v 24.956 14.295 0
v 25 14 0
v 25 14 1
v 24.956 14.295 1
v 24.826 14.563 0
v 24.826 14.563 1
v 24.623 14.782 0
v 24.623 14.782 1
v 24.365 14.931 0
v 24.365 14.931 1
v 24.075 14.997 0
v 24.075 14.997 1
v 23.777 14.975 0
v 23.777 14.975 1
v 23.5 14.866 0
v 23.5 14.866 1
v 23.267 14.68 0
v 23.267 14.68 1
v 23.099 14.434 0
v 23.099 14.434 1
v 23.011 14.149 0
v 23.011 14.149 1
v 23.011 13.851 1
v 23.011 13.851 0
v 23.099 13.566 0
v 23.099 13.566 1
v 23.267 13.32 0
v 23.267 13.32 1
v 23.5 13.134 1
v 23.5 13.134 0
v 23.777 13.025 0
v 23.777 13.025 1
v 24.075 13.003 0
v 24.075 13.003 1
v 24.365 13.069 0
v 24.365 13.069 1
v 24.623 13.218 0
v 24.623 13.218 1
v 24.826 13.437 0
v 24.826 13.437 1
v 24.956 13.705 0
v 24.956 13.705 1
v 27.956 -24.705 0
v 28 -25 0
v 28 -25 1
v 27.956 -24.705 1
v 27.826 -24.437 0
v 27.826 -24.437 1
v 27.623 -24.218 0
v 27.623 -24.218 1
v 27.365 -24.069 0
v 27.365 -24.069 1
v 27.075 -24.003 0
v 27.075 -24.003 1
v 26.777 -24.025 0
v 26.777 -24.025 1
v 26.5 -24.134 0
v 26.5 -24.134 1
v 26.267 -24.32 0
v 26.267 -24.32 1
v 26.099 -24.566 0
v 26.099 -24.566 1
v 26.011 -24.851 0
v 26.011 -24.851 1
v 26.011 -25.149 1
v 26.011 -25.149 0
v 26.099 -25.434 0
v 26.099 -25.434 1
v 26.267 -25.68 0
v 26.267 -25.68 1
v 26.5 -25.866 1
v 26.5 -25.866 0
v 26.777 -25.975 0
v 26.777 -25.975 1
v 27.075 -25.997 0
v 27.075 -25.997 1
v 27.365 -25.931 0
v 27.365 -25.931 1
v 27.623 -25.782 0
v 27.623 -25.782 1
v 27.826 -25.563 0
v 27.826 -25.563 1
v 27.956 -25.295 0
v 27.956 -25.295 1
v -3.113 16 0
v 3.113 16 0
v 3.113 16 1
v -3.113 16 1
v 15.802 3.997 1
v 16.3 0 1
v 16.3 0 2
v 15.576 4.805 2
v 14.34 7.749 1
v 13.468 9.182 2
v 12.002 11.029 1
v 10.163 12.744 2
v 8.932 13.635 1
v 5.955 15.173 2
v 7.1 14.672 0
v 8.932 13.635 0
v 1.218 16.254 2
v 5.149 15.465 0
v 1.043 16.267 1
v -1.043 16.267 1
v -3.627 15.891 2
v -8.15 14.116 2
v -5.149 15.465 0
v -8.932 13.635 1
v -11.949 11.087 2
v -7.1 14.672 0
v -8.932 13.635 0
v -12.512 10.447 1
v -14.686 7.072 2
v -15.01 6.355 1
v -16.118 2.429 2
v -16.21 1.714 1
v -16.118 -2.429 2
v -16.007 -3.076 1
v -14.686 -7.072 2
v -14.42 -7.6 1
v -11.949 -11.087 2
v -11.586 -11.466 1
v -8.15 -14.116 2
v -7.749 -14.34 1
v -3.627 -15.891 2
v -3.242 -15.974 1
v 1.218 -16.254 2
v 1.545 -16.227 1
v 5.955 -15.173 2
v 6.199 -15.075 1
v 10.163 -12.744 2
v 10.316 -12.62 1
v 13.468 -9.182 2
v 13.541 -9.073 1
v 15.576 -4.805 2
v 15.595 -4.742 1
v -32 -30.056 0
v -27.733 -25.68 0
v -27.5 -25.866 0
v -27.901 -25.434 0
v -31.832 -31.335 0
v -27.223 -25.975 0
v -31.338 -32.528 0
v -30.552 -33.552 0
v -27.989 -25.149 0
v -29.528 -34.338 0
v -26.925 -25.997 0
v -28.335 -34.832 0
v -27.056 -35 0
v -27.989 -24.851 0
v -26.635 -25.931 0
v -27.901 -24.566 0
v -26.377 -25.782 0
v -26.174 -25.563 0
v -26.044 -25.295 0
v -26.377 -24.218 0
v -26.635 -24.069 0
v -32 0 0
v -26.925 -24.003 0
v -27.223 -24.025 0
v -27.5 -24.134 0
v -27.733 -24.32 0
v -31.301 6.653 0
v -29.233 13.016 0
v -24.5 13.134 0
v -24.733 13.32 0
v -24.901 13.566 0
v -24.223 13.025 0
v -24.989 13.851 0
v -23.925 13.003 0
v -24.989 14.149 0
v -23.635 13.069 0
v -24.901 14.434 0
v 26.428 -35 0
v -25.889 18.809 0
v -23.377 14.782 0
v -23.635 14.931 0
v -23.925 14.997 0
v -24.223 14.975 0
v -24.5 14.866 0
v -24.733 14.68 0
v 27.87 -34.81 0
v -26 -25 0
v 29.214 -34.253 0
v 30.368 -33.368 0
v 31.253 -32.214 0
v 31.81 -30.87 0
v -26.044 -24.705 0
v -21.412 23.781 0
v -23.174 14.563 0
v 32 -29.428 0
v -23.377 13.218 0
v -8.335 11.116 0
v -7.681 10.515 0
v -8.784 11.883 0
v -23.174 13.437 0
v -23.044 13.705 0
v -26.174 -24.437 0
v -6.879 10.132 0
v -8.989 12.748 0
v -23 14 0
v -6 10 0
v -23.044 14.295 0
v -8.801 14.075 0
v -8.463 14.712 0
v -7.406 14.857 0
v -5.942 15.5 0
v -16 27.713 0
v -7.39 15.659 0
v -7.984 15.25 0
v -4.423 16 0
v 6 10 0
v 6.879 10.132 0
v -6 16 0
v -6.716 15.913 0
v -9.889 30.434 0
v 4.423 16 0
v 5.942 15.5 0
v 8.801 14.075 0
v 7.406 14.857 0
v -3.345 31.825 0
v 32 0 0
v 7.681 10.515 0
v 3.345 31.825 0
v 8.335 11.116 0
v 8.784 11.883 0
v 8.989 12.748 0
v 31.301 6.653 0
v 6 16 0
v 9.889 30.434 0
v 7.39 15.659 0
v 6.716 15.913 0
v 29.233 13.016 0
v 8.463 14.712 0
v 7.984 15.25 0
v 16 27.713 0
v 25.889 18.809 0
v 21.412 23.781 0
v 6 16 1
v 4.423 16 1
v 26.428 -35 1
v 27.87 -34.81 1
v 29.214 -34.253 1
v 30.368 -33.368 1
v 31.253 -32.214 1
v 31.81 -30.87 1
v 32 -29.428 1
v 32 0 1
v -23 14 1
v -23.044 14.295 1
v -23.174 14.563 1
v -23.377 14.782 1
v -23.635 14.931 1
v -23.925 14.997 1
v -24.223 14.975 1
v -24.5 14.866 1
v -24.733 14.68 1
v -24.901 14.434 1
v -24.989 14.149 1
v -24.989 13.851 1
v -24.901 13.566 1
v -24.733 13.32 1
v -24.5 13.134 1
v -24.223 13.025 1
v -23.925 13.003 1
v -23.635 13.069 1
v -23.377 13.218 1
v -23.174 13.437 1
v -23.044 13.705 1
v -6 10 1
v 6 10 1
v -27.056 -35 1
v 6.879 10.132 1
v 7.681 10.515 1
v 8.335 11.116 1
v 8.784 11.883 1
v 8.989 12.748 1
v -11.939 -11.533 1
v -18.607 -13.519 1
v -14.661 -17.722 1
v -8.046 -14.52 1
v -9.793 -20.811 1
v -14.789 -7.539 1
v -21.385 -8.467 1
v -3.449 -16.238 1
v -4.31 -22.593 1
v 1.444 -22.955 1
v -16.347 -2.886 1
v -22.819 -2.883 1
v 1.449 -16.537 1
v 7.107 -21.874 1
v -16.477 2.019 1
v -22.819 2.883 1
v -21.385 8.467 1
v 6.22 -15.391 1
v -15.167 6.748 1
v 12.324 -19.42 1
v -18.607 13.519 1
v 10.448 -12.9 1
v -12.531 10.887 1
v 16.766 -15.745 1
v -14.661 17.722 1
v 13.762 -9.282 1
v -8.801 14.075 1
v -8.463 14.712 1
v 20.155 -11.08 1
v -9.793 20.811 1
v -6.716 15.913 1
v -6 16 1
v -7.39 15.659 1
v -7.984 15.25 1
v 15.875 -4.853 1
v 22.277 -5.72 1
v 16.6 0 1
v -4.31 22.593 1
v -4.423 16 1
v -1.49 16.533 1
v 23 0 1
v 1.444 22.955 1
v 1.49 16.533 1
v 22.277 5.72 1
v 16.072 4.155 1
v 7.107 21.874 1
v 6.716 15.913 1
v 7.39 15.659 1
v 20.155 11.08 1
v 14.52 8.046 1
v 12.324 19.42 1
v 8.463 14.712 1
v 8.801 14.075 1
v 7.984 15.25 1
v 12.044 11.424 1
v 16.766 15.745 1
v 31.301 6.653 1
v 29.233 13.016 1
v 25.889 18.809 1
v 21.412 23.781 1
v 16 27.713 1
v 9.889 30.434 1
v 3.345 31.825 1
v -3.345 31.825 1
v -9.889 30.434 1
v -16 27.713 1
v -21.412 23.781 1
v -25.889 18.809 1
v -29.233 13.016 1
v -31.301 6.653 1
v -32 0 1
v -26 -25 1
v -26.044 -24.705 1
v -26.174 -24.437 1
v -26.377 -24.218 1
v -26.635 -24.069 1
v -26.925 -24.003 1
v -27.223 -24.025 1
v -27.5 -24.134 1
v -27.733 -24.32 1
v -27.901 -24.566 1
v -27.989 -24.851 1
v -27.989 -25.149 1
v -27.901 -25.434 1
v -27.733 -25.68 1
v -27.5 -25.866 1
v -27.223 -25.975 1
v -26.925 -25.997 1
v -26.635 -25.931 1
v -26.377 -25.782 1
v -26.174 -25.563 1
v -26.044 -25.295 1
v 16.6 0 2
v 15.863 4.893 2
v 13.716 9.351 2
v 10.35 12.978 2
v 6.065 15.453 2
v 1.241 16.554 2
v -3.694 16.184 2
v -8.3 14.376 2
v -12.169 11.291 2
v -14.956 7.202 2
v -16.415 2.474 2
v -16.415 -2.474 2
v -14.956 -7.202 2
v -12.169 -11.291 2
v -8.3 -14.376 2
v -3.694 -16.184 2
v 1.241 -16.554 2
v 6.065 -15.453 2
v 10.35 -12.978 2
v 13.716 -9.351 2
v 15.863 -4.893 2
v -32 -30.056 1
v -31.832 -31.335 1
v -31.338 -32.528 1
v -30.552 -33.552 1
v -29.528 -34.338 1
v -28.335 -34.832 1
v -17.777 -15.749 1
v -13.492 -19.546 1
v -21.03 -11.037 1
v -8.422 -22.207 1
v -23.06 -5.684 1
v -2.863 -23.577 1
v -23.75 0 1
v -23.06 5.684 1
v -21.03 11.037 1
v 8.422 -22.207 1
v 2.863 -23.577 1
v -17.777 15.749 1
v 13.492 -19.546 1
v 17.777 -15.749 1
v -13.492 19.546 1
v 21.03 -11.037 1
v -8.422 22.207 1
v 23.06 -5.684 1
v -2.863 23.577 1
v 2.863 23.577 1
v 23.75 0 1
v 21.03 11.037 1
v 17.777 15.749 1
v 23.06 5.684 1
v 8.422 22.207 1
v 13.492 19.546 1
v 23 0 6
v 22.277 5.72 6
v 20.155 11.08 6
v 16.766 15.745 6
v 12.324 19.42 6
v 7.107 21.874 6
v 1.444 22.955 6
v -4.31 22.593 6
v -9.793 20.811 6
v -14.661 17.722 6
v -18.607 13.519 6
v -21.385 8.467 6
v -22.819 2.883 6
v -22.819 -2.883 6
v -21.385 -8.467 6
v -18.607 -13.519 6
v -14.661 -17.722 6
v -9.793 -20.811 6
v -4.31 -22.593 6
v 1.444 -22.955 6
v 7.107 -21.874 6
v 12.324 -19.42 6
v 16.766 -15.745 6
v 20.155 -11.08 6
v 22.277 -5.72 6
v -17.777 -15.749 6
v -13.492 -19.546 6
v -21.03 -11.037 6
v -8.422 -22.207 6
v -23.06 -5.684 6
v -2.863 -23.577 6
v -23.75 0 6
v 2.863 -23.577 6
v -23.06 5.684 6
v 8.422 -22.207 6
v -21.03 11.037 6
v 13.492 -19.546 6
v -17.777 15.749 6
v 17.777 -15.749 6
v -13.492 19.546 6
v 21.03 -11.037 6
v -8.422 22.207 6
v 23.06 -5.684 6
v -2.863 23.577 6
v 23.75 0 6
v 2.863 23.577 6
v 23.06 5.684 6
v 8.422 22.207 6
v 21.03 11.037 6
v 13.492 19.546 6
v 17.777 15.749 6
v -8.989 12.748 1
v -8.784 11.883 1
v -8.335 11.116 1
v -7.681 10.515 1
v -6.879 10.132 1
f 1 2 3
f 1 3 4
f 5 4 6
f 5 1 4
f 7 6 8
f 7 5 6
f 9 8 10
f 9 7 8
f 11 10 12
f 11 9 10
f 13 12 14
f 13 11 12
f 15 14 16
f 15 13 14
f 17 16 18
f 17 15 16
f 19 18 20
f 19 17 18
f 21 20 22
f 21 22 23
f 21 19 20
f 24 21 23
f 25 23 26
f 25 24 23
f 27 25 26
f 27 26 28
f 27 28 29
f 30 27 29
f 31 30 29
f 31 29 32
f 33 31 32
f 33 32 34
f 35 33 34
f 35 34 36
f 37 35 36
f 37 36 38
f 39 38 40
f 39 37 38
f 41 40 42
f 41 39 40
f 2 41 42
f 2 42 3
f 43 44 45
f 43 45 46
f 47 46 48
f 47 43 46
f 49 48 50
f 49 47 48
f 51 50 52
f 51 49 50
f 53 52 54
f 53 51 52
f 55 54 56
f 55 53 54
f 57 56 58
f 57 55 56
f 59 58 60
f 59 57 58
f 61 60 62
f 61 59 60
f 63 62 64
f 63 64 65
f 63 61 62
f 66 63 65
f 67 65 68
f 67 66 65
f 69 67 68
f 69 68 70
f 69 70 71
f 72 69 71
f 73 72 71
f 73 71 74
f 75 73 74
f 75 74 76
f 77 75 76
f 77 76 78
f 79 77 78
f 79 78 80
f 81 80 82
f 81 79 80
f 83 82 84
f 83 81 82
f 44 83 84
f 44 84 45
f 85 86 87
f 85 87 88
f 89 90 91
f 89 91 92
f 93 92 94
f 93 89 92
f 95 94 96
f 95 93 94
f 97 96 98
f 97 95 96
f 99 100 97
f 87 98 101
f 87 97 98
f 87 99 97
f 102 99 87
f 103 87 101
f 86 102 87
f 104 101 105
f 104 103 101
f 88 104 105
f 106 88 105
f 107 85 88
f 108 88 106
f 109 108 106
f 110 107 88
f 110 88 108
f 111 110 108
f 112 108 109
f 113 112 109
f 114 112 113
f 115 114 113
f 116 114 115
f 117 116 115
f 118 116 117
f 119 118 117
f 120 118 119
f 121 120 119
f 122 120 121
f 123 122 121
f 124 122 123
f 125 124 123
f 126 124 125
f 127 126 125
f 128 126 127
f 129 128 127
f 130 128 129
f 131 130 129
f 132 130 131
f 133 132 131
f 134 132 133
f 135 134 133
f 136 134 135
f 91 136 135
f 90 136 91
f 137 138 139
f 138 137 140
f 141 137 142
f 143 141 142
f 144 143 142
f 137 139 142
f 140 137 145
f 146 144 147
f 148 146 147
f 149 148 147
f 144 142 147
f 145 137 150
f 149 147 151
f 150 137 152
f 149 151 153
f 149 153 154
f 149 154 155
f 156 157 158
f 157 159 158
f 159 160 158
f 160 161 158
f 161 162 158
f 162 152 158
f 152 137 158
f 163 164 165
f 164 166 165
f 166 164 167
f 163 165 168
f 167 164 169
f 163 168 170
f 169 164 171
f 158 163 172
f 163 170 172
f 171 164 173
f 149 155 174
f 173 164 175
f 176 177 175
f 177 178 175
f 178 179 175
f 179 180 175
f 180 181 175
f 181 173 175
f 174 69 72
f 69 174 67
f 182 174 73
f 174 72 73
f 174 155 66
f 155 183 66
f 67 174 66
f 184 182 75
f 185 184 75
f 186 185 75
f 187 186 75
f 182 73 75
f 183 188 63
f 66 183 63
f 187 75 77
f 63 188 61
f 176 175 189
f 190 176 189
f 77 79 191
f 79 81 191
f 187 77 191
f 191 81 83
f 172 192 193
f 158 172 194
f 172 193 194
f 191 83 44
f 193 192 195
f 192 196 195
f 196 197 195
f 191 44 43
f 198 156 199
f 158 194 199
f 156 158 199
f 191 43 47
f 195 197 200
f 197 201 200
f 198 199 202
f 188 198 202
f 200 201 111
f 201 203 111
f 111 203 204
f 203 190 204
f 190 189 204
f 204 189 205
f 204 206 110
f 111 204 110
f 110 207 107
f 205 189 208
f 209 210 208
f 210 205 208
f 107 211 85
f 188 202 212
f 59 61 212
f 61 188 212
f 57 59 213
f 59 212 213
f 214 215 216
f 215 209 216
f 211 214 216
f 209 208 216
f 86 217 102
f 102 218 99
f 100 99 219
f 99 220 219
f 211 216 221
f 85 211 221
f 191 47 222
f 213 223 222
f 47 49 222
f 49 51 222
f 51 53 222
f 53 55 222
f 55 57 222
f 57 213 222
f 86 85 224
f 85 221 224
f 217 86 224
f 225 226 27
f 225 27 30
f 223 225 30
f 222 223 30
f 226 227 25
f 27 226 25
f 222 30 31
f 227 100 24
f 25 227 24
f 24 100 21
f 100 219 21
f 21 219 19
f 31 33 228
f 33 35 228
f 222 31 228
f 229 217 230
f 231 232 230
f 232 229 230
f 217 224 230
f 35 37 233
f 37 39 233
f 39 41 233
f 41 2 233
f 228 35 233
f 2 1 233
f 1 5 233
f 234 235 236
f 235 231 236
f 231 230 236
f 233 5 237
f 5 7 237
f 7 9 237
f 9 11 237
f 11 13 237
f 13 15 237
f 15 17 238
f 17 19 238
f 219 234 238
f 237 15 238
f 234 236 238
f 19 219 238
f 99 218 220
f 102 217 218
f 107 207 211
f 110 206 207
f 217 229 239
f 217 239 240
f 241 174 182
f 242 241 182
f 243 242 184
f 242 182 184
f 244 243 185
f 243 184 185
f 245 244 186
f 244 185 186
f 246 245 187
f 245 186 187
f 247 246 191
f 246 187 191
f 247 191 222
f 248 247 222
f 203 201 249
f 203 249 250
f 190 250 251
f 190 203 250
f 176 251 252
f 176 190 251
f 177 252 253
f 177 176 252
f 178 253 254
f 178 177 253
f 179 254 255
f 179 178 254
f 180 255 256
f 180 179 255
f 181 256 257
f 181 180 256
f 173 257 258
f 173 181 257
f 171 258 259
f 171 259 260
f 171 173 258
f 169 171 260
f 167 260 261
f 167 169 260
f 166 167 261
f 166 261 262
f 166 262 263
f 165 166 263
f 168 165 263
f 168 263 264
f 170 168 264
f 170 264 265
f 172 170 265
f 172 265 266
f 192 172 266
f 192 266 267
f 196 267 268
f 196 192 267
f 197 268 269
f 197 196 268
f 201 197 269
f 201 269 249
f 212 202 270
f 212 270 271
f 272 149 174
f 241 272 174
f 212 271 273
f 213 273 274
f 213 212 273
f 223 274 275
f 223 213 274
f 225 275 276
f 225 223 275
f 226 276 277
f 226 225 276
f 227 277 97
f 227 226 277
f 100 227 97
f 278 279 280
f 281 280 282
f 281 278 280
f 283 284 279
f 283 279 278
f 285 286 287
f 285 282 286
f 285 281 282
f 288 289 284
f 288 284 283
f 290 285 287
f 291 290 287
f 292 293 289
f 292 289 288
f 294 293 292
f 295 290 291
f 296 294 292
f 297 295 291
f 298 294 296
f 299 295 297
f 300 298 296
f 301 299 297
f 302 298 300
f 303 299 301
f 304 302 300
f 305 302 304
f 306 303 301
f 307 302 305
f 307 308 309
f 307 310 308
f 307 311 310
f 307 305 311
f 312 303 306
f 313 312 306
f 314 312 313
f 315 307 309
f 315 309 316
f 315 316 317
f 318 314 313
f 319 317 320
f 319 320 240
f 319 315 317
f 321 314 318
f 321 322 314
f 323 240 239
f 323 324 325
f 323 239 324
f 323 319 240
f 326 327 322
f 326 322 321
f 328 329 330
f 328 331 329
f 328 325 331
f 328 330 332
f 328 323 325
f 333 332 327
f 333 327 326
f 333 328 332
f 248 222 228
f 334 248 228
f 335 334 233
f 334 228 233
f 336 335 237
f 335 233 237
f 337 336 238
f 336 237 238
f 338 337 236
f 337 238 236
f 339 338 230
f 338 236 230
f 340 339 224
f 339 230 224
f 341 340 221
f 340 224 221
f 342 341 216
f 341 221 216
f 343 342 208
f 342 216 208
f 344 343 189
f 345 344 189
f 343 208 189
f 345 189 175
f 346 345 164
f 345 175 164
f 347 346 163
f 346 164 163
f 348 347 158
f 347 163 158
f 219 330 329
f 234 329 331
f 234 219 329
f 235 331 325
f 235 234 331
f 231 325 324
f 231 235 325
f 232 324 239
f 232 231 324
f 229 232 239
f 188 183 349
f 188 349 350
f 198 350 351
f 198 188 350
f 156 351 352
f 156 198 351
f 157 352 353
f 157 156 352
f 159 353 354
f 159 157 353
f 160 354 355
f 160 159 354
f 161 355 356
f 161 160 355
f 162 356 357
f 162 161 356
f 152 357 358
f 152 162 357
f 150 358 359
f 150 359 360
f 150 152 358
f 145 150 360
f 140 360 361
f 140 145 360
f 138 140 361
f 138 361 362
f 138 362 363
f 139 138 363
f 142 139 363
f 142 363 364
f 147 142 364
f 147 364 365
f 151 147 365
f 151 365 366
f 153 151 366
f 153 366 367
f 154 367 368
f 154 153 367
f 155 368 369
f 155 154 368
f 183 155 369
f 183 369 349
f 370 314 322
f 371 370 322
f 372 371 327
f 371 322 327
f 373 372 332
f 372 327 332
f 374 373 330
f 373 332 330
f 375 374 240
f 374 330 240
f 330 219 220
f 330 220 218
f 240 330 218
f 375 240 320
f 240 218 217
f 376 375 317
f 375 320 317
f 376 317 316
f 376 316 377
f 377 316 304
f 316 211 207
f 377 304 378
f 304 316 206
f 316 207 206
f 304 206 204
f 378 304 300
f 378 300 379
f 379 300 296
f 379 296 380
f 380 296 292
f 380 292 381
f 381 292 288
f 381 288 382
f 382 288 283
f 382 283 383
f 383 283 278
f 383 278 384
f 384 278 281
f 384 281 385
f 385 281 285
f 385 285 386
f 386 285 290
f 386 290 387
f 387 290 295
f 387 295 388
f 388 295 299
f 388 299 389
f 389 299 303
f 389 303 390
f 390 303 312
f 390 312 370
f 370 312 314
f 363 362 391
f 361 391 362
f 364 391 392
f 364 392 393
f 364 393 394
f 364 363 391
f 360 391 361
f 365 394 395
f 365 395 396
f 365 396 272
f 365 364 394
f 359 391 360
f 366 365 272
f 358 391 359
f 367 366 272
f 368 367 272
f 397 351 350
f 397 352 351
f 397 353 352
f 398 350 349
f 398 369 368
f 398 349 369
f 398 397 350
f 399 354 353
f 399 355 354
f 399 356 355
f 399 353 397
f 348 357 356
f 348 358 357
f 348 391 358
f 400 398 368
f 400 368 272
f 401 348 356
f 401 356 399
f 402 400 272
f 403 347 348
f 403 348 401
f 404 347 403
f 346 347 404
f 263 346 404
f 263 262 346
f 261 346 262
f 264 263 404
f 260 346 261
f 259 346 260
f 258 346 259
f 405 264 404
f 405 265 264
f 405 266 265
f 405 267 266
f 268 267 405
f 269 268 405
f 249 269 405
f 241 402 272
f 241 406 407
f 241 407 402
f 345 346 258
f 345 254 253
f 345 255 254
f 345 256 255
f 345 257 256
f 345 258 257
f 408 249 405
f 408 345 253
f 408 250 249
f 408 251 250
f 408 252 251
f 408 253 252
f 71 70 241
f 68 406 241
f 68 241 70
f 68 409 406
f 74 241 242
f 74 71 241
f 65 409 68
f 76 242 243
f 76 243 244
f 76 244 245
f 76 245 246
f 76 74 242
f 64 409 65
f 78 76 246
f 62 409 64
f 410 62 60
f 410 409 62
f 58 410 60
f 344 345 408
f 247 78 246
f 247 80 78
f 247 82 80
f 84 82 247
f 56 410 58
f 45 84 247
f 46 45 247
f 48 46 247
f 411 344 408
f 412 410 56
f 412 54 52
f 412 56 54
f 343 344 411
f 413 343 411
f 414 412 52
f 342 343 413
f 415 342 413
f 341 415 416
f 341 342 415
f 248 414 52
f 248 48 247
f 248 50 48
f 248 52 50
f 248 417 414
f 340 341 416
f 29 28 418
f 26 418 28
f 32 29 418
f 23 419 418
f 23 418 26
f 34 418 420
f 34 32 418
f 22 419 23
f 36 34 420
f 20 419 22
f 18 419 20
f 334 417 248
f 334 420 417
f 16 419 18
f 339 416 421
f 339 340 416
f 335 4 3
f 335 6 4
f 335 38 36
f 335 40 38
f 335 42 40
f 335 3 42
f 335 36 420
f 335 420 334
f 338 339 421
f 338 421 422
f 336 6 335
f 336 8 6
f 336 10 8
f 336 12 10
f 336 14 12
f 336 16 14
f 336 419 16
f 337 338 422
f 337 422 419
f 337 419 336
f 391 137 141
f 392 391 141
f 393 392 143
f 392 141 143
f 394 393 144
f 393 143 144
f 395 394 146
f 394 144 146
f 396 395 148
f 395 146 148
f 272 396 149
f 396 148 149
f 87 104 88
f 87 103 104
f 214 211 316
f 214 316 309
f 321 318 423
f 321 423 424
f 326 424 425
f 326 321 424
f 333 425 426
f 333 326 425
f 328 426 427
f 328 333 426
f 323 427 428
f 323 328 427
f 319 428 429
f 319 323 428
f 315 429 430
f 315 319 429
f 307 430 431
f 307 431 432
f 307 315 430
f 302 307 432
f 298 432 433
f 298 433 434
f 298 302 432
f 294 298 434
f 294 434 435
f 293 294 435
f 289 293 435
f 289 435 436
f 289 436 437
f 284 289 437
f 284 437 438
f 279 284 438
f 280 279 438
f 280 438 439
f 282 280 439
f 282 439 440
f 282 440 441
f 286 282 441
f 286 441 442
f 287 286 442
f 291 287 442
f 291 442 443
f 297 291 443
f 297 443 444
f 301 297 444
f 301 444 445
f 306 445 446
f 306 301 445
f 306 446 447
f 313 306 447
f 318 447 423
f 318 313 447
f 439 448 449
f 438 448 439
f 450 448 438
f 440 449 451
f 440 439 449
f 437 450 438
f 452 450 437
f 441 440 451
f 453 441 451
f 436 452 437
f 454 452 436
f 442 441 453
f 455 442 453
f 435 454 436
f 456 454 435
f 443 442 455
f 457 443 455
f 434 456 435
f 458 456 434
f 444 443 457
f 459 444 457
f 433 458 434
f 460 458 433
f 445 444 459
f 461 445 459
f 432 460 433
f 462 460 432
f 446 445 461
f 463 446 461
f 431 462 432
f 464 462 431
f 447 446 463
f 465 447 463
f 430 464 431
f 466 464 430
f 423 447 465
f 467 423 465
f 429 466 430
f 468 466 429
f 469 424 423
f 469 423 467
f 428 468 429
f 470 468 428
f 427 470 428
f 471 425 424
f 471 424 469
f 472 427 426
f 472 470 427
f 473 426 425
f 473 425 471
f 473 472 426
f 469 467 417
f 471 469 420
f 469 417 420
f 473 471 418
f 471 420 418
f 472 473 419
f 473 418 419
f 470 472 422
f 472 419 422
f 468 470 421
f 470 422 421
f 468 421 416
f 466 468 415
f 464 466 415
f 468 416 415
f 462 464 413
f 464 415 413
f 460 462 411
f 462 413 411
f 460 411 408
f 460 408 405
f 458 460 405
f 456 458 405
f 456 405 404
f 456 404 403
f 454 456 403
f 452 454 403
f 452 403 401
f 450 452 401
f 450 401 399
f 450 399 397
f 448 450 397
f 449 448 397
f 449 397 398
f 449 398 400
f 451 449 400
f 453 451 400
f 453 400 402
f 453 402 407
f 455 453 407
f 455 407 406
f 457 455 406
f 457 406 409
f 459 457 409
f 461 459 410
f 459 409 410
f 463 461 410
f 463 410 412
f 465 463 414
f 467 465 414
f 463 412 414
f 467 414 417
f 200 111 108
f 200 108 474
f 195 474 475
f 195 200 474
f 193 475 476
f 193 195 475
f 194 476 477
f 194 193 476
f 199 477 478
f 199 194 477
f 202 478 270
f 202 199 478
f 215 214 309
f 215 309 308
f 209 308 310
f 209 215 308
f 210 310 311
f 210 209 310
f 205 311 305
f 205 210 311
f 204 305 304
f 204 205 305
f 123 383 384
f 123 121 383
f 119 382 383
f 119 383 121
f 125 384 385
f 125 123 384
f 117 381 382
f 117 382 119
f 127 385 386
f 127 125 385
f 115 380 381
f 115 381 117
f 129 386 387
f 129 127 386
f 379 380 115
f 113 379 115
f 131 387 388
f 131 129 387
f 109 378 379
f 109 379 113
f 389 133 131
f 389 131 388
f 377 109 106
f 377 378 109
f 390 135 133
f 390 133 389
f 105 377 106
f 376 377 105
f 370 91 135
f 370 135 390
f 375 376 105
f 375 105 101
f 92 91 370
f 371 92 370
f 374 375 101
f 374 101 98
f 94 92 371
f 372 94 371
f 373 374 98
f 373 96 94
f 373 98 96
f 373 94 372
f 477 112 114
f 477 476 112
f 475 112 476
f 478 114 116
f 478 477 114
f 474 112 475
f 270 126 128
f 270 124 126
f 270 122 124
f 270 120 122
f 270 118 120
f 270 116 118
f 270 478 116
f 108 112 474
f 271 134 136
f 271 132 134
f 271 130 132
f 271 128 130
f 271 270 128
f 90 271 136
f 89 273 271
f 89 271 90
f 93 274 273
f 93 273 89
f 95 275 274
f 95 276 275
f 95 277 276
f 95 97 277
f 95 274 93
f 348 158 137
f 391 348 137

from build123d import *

# Parameters (mm, degrees)
TUBE_R        = 23.75
TUBE_R_2      = 23
TUBE_DEPTH    = 6
SKETCH004_R   = 1
PAD002_DEPTH  = 1
SKETCH006_R   = 16.6
SKETCH006_R_2 = 16.3
PAD003_DEPTH  = 2


with BuildPart() as tube:
    # Tube → Tube (new body)
    with BuildSketch(Plane.XY):
        Circle(TUBE_R)
        Circle(TUBE_R_2, mode=Mode.SUBTRACT)
    extrude(amount=TUBE_DEPTH)


with BuildPart() as fusion002:
    # Sketch004 → Pad002 (new body)
    with BuildSketch(Plane.XY):
        with BuildLine():
            ThreePointArc((32, 0), (0, 32), (-32, 0))
            Line((-32, 0), (-32, -30.055735))
            ThreePointArc((-32, -30.055735), (-30.551858, -33.551858), (-27.055735, -35))
            Line((-27.055735, -35), (26.427752, -35))
            ThreePointArc((26.427752, -35), (30.367926, -33.367926), (32, -29.427752))
            Line((32, -29.427752), (32, 0))
        make_face()
        with Locations((-27, -25)):
            Circle(SKETCH004_R, mode=Mode.SUBTRACT)
        with Locations((27, -25)):
            Circle(SKETCH004_R, mode=Mode.SUBTRACT)
        with Locations((24, 14)):
            Circle(SKETCH004_R, mode=Mode.SUBTRACT)
        with Locations((-24, 14)):
            Circle(SKETCH004_R, mode=Mode.SUBTRACT)
        with BuildLine():
            ThreePointArc((-6, 16), (-9, 13), (-6, 10))
            Line((-6, 10), (6, 10))
            ThreePointArc((6, 10), (9, 13), (6, 16))
            Line((6, 16), (-6, 16))
        make_face(mode=Mode.SUBTRACT)
    extrude(amount=PAD002_DEPTH)

    # Sketch006 → Pad003 (join)
    with BuildSketch(Plane.XY):
        Circle(SKETCH006_R)
        Circle(SKETCH006_R_2, mode=Mode.SUBTRACT)
    extrude(amount=PAD003_DEPTH)

    # Fusion002: union Tube
    add(tube.part)


solid = fusion002.part
